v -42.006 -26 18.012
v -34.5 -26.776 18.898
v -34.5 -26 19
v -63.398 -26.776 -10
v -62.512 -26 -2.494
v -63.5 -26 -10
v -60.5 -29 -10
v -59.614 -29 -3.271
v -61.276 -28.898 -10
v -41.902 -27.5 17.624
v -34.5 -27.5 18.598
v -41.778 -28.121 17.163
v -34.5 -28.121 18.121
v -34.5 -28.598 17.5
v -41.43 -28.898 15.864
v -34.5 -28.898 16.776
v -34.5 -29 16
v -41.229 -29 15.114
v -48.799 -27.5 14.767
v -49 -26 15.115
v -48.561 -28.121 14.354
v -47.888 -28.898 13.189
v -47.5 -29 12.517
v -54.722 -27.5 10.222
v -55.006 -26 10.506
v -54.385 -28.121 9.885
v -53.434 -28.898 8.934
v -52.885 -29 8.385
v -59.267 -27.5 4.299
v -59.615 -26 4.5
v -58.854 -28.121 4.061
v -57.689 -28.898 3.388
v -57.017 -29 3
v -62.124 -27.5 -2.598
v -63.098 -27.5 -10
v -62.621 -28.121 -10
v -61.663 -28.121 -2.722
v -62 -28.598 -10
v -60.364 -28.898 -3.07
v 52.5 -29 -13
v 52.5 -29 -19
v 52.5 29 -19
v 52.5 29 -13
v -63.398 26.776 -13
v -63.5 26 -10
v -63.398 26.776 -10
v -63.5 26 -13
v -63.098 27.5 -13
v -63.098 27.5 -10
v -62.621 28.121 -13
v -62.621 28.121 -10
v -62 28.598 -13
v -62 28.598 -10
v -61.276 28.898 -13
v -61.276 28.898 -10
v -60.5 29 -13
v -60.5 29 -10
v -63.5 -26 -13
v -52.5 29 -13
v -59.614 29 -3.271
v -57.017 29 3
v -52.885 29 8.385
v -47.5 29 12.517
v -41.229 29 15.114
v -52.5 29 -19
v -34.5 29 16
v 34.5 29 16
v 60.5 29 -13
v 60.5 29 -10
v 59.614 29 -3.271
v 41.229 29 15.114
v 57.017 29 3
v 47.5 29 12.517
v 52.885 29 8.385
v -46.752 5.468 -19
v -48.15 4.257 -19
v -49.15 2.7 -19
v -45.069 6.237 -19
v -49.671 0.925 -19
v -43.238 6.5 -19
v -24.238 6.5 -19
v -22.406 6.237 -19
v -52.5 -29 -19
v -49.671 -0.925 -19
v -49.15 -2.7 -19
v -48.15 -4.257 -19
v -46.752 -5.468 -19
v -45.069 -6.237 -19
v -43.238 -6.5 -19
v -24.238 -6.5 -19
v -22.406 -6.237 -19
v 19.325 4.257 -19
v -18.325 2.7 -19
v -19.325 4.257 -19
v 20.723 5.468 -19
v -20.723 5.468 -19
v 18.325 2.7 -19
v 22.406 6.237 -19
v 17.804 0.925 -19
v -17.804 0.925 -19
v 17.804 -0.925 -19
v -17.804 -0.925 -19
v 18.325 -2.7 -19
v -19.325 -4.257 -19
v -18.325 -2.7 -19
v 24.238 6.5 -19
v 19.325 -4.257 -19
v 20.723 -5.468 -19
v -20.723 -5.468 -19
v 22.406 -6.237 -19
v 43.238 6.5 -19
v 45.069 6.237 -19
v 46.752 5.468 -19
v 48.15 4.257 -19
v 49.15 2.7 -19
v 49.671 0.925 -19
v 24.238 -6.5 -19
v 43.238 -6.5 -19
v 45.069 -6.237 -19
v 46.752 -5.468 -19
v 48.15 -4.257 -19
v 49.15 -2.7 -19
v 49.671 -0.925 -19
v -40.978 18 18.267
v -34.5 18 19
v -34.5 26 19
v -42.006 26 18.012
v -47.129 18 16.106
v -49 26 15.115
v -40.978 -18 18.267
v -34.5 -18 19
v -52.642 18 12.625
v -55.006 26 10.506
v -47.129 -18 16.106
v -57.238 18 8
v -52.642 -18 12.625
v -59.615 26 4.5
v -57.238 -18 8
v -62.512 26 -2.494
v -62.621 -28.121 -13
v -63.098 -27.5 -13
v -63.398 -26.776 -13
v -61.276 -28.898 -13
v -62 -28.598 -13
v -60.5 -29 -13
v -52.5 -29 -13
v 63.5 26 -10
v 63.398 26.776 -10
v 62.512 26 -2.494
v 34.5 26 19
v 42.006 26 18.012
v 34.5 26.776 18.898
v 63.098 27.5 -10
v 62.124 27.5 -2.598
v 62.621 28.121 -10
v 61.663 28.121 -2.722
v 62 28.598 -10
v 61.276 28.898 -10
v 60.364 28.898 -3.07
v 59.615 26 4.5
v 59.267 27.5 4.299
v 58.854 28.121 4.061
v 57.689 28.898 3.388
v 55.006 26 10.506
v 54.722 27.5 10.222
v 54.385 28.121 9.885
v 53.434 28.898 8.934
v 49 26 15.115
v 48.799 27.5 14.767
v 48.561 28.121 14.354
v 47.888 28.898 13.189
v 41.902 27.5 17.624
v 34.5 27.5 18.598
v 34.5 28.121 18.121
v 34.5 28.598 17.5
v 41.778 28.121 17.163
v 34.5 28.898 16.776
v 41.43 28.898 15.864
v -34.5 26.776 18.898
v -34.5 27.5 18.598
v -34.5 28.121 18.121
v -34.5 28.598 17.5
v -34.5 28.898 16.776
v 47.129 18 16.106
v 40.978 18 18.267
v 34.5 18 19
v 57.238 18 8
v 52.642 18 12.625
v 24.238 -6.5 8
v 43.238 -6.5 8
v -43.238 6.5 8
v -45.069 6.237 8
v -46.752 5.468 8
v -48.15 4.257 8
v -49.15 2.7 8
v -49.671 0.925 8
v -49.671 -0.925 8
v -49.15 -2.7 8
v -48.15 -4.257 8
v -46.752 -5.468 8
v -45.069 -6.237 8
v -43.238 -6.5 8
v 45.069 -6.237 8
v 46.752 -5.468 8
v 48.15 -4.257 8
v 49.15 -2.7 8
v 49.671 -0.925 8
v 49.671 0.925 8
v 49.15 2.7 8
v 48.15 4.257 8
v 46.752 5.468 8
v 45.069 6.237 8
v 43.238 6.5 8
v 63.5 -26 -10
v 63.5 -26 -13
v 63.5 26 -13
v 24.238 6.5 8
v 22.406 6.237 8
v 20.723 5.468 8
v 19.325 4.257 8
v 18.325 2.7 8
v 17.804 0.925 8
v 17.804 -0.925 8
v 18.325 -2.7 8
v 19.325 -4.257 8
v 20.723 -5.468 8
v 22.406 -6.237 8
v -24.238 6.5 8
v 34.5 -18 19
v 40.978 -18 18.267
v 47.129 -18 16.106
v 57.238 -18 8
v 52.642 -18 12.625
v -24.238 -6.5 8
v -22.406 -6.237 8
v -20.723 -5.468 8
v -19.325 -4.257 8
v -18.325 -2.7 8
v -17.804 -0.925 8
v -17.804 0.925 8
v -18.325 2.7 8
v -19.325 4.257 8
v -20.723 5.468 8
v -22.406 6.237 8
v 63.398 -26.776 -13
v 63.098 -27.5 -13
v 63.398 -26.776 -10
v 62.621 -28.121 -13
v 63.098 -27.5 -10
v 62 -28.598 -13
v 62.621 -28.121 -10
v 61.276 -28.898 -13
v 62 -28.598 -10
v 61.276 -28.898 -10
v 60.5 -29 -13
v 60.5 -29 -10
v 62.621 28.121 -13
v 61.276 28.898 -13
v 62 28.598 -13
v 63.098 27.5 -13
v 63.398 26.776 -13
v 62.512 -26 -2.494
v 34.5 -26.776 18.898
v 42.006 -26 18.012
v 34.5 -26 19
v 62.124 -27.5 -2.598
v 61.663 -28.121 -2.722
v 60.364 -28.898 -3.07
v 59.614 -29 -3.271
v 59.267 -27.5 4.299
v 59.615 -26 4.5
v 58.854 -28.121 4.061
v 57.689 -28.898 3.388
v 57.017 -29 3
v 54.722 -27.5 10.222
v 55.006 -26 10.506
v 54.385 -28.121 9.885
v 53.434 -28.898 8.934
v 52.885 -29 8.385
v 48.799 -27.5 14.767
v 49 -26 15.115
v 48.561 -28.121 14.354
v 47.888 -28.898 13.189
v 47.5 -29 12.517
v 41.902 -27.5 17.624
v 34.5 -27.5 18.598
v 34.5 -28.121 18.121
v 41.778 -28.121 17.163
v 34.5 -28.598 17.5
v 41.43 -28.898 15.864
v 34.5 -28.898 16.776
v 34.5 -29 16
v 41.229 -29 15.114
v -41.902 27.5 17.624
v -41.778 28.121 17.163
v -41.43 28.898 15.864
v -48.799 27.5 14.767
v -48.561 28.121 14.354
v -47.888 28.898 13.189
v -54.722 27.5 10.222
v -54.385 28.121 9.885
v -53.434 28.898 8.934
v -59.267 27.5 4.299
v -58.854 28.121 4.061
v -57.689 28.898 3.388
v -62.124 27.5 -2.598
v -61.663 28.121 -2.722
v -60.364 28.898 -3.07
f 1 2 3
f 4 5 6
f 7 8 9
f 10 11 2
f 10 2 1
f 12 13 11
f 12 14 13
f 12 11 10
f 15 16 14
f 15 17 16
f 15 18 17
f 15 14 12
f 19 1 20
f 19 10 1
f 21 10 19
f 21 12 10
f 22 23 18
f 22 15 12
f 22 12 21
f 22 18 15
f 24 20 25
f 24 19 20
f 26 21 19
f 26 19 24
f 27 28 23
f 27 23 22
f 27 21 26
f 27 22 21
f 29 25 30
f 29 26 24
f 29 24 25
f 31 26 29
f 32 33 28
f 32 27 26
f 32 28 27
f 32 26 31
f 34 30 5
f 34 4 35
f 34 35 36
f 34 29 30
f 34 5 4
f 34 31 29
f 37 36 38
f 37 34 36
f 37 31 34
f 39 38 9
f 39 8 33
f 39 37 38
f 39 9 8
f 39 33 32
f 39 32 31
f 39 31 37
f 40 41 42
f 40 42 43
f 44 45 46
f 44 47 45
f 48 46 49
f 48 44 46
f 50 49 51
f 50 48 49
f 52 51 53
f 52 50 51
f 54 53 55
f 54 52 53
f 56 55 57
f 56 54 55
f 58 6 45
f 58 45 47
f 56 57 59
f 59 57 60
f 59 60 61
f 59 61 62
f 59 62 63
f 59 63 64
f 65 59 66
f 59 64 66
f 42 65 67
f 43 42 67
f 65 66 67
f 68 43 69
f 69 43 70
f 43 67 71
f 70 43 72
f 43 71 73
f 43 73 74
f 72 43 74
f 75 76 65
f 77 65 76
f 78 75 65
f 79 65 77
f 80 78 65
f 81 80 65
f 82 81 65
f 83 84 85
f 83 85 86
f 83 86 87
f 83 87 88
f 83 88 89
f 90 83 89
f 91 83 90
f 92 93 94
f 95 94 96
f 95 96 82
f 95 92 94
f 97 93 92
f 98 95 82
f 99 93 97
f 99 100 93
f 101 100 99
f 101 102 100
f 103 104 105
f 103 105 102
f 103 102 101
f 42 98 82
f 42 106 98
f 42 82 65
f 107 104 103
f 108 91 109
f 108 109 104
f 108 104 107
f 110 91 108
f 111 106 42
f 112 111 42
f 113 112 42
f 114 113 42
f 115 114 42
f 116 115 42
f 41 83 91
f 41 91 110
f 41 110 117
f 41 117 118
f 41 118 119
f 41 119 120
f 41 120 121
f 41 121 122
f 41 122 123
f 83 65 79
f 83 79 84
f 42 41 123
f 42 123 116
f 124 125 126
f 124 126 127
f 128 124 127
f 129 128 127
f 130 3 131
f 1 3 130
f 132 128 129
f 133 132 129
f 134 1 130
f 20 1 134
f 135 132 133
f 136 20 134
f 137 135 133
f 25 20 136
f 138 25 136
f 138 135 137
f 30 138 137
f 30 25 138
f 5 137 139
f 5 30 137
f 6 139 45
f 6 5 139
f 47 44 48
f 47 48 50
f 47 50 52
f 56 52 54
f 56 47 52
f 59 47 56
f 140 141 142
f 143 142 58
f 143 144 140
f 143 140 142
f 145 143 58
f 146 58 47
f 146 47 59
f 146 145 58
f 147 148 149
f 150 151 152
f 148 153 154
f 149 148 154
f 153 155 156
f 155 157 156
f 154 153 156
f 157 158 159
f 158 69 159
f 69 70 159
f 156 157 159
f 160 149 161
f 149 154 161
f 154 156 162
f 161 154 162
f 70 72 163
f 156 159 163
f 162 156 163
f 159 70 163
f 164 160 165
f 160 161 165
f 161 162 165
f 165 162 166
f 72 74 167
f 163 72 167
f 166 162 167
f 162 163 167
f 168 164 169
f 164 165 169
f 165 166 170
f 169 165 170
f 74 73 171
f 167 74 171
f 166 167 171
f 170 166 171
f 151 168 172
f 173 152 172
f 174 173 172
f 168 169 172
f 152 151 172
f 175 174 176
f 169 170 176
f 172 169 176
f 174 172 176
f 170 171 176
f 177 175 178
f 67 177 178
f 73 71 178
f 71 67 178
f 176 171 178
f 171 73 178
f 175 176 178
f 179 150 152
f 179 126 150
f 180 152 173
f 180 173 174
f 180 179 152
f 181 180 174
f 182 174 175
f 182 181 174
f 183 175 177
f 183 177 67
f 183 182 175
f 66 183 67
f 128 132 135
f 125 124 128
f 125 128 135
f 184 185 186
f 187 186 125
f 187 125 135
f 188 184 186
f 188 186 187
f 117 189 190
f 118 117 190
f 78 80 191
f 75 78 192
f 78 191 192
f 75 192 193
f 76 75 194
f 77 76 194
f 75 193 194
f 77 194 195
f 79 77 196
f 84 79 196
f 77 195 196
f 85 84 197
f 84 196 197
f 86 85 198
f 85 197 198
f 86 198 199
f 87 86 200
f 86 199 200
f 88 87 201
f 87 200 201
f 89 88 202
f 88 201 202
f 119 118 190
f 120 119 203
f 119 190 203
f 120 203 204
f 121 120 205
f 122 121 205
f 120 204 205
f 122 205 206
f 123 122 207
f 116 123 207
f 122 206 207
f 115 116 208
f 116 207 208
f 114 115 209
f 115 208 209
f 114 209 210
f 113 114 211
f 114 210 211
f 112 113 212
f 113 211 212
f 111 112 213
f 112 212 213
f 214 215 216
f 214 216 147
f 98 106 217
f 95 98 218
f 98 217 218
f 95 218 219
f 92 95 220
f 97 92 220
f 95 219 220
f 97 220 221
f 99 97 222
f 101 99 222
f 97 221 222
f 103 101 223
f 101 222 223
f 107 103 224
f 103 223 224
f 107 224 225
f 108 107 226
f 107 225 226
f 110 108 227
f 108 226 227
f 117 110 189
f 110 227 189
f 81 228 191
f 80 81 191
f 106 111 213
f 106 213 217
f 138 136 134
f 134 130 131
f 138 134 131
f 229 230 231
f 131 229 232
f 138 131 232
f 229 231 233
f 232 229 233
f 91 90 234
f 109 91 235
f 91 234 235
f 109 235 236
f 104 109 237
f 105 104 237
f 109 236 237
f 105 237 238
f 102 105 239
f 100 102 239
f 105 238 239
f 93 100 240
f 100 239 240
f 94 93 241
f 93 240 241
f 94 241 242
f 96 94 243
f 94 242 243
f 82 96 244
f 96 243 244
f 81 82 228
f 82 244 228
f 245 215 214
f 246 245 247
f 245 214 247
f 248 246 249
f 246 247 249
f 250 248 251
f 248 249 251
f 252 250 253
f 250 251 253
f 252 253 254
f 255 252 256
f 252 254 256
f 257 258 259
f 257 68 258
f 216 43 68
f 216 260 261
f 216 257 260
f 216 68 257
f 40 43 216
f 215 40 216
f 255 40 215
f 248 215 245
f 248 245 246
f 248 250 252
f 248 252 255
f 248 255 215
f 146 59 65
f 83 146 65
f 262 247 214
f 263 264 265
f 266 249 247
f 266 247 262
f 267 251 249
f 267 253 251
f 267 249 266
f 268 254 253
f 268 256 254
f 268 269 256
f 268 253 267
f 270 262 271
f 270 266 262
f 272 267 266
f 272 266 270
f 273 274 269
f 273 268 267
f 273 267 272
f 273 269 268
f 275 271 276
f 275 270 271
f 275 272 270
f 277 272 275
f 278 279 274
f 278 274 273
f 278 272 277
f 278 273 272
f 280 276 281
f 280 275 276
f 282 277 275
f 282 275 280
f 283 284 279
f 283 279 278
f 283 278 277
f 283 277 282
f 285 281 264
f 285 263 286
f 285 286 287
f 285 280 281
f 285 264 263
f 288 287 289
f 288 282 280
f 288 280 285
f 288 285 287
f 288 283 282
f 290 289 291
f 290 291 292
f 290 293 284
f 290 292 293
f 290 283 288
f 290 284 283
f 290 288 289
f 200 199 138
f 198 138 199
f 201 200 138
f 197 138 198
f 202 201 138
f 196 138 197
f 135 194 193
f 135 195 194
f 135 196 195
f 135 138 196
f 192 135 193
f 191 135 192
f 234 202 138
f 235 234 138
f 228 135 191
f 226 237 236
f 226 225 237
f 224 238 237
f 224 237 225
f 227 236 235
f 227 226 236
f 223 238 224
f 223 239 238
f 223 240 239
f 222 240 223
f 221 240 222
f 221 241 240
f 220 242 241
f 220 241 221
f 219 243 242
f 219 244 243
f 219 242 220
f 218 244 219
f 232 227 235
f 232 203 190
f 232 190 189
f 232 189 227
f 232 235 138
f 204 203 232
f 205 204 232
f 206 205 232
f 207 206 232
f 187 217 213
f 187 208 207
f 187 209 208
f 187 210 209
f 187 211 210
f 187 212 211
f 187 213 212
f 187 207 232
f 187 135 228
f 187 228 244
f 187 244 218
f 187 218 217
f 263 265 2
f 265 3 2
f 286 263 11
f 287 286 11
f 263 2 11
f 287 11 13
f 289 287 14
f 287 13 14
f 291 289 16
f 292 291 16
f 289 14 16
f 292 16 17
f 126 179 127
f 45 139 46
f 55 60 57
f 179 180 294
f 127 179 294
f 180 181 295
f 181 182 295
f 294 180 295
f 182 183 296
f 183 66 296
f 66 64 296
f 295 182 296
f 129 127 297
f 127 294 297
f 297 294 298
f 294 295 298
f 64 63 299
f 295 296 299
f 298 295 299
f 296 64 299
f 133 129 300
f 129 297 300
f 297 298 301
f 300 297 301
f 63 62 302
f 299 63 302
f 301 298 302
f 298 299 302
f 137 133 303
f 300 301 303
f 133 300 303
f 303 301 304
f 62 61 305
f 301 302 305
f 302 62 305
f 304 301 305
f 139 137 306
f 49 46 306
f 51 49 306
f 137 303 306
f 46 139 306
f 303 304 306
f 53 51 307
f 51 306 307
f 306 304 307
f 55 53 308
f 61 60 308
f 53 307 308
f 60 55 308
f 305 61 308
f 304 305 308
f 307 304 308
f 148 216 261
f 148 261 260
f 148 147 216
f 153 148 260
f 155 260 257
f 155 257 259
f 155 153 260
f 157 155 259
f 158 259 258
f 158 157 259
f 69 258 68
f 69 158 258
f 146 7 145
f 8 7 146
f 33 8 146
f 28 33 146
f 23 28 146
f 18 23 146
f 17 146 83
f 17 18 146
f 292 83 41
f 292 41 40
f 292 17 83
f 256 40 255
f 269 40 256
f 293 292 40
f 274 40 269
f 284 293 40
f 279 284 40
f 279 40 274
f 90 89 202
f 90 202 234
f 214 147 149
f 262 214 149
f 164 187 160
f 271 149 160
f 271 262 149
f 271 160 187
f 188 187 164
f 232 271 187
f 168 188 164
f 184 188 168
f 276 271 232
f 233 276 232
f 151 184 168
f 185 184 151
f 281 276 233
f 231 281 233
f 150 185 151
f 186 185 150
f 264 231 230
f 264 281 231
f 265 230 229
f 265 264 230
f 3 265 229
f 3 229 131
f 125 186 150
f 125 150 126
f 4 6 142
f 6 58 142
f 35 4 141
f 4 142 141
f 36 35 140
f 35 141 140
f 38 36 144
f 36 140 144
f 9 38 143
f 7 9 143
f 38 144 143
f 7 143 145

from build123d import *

# Parameters (mm, degrees)
F1_DEPTH = 29
F2_W     = 155.196704
F2_H     = 36
F3_DEPTH = 11
F5_DEPTH = 27.001
F6_R     = 3


with BuildPart() as f1:
    # F0 (on Front) → F1 (new body, symmetric)
    with BuildSketch(Plane.XZ):
        with BuildLine():
            Line((34.5, 19), (-34.5, 19))
            ThreePointArc((-34.5, 19), (-55.006097, 10.506097), (-63.5, -10))
            Line((-63.5, -10), (-63.5, -13))
            Line((-63.5, -13), (-52.5, -13))
            Line((-52.5, -13), (-52.5, -19))
            Line((-52.5, -19), (52.5, -19))
            Line((52.5, -19), (52.5, -13))
            Line((52.5, -13), (63.5, -13))
            Line((63.5, -13), (63.5, -10))
            ThreePointArc((63.5, -10), (55.006097, 10.506097), (34.5, 19))
        make_face()
    extrude(amount=F1_DEPTH, both=True)

    # F2 (on face) → F3 (cut)
    with BuildSketch(Plane.XY.offset(19)):
        with Locations((-5.67447, 0)):
            Rectangle(F2_W, F2_H)
    extrude(amount=-F3_DEPTH, mode=Mode.SUBTRACT)

    # F4 (on face) → F5 (cut, through all)
    with BuildSketch(Plane.XY.offset(8)):
        with BuildLine():
            Line((-24.237634, 6.5), (-43.237634, 6.5))
            ThreePointArc((-43.237634, 6.5), (-49.737634, 0), (-43.237634, -6.5))
            Line((-43.237634, -6.5), (-24.237634, -6.5))
            ThreePointArc((-24.237634, -6.5), (-17.737634, 0), (-24.237634, 6.5))
        make_face()
        with BuildLine():
            Line((43.237634, 6.5), (24.237634, 6.5))
            ThreePointArc((24.237634, 6.5), (17.737634, 0), (24.237634, -6.5))
            Line((24.237634, -6.5), (43.237634, -6.5))
            ThreePointArc((43.237634, -6.5), (49.737634, 0), (43.237634, 6.5))
        make_face()
    extrude(amount=-F5_DEPTH, mode=Mode.SUBTRACT)

    # F6
    f6_edges = [f1.edges().sort_by_distance(p)[0] for p in [
        (-55.006097, -29, 10.506097),
        (55.006097, 29, 10.506097),
    ]]
    fillet(f6_edges, radius=F6_R)


solid = f1.part
